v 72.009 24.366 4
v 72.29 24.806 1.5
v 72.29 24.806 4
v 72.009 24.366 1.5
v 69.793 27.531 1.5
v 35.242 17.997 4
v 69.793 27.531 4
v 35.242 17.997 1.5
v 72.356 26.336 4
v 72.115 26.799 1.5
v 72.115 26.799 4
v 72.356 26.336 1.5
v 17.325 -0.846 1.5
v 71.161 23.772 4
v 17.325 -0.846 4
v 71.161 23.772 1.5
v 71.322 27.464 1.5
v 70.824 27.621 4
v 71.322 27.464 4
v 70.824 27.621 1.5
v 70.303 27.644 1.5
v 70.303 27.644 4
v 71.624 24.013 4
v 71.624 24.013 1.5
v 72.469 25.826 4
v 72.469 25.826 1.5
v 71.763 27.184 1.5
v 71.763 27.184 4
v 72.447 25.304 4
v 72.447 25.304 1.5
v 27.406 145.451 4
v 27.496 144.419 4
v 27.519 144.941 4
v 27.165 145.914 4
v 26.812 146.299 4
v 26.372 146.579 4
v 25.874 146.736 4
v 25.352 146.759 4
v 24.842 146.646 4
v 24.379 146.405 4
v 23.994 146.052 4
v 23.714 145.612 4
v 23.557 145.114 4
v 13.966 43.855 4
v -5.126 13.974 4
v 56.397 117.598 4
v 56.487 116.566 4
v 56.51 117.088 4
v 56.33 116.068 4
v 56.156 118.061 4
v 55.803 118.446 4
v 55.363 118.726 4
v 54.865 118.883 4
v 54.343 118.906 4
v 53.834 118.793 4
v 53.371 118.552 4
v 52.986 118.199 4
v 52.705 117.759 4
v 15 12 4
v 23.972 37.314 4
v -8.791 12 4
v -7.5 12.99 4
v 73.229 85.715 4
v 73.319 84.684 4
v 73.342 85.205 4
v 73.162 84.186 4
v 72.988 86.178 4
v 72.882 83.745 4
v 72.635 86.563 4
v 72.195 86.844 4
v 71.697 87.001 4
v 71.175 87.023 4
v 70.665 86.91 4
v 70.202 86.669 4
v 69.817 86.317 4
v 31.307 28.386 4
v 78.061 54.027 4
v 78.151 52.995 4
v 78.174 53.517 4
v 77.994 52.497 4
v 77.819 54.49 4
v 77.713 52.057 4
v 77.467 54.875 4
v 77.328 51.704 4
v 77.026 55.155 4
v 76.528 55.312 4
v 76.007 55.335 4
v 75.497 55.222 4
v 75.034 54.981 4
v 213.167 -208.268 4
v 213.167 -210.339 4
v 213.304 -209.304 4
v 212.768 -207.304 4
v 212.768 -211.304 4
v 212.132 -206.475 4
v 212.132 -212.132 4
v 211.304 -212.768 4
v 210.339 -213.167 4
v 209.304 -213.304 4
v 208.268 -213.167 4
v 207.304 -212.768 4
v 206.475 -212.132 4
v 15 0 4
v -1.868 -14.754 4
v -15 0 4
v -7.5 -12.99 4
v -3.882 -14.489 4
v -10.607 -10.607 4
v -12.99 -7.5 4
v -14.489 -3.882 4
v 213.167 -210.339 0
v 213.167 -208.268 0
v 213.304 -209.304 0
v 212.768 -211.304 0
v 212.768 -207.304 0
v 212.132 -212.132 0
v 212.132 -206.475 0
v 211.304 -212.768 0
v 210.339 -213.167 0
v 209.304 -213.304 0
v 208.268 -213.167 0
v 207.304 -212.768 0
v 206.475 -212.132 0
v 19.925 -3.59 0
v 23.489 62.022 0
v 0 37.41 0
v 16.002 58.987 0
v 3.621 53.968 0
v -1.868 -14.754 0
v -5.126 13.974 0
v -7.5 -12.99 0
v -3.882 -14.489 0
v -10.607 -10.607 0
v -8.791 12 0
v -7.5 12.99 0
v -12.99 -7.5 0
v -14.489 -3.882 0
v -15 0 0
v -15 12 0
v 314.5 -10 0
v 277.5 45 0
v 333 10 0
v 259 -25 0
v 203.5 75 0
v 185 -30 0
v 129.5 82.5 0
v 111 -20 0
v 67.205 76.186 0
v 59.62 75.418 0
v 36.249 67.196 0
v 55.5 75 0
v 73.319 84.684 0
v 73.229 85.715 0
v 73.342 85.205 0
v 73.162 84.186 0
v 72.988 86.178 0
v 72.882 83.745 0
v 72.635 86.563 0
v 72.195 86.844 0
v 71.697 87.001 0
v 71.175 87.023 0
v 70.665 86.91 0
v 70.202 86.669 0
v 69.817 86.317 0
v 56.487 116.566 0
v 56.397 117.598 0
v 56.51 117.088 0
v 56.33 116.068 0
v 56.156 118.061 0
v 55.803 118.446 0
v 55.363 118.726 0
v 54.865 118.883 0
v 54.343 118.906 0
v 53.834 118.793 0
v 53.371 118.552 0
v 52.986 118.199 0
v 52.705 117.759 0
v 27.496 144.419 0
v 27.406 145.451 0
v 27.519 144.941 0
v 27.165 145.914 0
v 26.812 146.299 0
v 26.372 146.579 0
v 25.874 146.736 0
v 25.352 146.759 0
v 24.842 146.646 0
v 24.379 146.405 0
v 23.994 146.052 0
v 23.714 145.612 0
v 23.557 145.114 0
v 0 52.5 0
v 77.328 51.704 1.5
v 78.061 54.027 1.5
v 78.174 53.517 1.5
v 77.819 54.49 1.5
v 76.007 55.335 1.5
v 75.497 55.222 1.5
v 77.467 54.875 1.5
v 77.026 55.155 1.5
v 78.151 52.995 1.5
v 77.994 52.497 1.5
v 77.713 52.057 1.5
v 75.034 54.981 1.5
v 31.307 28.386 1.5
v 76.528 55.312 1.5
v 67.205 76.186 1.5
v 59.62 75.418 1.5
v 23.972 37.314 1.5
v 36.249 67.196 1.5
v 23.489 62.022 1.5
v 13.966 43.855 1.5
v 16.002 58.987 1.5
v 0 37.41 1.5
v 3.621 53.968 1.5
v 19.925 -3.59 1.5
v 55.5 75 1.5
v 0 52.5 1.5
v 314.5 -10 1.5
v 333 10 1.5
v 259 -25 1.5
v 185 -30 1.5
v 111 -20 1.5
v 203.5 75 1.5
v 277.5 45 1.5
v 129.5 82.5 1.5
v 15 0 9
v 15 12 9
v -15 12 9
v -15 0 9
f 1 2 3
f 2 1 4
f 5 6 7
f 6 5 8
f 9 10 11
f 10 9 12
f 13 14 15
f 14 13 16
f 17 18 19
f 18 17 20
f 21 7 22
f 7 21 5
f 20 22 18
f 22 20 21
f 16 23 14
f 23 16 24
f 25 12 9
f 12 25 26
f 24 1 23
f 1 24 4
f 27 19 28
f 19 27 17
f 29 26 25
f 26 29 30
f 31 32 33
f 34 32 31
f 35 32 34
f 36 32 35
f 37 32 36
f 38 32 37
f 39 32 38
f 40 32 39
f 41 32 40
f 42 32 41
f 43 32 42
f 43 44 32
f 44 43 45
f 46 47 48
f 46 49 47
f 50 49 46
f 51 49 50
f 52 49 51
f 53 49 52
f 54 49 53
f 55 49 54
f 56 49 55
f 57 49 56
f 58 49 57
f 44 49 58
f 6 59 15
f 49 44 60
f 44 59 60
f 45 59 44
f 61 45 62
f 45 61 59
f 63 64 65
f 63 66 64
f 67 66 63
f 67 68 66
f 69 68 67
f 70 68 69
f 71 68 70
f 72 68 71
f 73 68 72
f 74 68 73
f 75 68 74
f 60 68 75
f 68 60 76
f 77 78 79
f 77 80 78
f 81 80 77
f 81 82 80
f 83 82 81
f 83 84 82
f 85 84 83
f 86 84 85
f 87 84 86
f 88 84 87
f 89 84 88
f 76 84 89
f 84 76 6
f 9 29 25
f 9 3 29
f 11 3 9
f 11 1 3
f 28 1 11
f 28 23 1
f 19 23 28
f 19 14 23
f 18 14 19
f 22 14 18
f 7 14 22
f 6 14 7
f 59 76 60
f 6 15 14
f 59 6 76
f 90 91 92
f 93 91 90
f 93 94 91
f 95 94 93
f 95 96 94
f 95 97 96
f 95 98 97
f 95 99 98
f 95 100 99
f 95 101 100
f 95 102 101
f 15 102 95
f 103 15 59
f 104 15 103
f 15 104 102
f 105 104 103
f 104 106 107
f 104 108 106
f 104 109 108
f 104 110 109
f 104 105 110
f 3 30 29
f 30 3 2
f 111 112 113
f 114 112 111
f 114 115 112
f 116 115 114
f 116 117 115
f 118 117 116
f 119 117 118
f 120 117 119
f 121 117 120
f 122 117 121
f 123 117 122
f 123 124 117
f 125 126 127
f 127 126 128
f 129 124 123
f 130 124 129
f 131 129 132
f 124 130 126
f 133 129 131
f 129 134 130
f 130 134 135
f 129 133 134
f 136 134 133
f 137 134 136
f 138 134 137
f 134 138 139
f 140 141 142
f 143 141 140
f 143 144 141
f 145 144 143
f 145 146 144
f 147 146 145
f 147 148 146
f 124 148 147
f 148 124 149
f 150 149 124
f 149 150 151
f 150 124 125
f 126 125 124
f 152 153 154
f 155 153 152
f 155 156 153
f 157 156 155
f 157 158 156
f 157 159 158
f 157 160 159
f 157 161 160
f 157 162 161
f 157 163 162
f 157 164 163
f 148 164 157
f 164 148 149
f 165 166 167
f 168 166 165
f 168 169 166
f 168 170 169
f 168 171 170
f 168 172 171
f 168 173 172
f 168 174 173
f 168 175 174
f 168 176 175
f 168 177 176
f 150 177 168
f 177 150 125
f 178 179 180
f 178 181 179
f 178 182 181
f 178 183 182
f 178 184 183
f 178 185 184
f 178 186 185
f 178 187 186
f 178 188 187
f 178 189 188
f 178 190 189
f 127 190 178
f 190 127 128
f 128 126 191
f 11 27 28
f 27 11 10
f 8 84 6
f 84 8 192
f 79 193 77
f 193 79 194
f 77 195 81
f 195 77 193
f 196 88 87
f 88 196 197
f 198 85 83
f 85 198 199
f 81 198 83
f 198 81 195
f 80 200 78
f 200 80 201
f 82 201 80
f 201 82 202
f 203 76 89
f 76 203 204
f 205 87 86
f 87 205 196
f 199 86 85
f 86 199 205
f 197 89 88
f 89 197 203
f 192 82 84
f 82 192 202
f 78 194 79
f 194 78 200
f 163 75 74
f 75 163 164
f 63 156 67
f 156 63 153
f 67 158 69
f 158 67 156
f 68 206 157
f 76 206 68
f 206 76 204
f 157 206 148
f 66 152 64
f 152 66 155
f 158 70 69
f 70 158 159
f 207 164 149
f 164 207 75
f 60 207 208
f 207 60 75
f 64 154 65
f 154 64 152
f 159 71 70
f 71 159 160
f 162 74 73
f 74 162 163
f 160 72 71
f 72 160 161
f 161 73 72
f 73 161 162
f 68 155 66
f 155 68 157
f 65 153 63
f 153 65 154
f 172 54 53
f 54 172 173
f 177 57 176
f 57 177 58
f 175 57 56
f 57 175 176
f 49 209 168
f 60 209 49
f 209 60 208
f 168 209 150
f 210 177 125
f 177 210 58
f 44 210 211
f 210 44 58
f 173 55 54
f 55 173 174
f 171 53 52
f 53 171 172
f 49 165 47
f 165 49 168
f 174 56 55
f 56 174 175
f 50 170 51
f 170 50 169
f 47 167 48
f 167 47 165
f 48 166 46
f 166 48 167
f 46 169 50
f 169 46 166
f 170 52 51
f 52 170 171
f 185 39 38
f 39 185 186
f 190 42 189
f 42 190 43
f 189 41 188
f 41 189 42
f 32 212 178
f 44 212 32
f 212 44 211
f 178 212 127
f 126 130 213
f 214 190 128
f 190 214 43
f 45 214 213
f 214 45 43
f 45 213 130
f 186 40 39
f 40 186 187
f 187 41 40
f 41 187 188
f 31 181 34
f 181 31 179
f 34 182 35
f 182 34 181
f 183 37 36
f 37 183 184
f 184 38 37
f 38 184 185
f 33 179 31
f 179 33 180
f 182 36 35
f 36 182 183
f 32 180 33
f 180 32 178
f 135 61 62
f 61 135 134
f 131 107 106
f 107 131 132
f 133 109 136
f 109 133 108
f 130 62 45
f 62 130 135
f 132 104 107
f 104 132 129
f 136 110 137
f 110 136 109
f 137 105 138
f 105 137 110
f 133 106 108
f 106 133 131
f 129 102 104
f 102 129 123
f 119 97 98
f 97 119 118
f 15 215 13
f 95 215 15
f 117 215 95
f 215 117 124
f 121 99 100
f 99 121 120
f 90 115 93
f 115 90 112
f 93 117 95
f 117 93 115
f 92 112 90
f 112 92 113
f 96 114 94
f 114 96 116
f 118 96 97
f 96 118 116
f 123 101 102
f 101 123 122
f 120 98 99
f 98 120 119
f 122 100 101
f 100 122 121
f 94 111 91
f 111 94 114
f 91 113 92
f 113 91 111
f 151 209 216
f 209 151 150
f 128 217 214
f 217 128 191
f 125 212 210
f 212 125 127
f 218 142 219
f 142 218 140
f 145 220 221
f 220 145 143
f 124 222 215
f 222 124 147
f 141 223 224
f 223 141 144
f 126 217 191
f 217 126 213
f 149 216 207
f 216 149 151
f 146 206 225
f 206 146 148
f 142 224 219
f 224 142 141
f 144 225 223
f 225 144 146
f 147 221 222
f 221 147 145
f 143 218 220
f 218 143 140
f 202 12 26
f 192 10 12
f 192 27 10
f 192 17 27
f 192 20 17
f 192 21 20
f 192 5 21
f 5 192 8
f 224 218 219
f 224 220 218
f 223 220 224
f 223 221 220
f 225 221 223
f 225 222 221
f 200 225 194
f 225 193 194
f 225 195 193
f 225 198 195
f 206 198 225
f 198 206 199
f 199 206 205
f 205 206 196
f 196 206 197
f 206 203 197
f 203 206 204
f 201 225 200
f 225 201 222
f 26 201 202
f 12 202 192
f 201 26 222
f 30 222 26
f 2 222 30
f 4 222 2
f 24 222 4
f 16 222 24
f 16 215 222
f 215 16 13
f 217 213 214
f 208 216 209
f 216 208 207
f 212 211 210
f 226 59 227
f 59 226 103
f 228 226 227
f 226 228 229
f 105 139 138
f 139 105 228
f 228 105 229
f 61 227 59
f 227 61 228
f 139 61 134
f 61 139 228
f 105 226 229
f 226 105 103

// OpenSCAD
// DRAGON WING — single piece, 370mm span, parametric
// Prints flat on the bed, slots into dragon head wing mount
// Bat-wing design: membrane between structural fingers

// Material: PA12-CF black (for the frame) or translucent PETG (backlit effect)

/* [Wing Dimensions] */
SPAN = 370;             // mm — total span from shoulder to tip
CHORD = 150;            // mm — wing depth (shoulder to trailing edge)
FINGER_COUNT = 5;       // number of structural fingers
MEMBRANE_THICK = 1.5;   // mm — thin for translucency
FRAME_THICK = 4;        // mm — structural frame

$fn = 24;

// Wing frame — fingers radiating from shoulder
module wing_frame() {
    // Shoulder joint — mounts to dragon head
    translate([0, 0, 0]) {
        cylinder(h=FRAME_THICK, r=15);
    }
    
    // Main leading edge spar
    translate([0, 0, 0]) {
        rotate([0, 0, -45]) {
            hull() {
                cylinder(h=FRAME_THICK, r=12);
                translate([SPAN * 0.8, 0, 0]) {
                    cylinder(h=FRAME_THICK, r=4);
                }
            }
        }
    }
    
    // Fingers — radiating structure
    for (i = [0: FINGER_COUNT - 1]) {
        angle = -70 + i * 15;  // fan out
        translate([0, 0, 0]) {
            rotate([0, 0, angle]) {
                hull() {
                    cylinder(h=FRAME_THICK, r=8);
                    length = CHORD * (0.5 + i * 0.12);
                    translate([0, length, 0]) {
                        cylinder(h=FRAME_THICK, r=2);
                    }
                }
            }
        }
    }
}

// Membrane — thin web between fingers
module membrane() {
    linear_extrude(height=MEMBRANE_THICK) {
        // Approximate shape using a polygon between finger tips
        polygon(points=[
            [0, 0],  // shoulder
            // Along leading edge
            [SPAN * 0.3, -20],
            [SPAN * 0.5, -30],
            [SPAN * 0.7, -25],
            [SPAN * 0.85, -10],
            // Wing tip
            [SPAN * 0.9, 10],
            // Sweep back along trailing edge (finger tips)
            [SPAN * 0.75, CHORD * 0.3],
            [SPAN * 0.55, CHORD * 0.5],
            [SPAN * 0.35, CHORD * 0.55],
            [SPAN * 0.15, CHORD * 0.5],
            [0, CHORD * 0.35],
        ]);
    }
}

// Mount pin — slides into dragon head dovetail
module mount_pin() {
    translate([-15, 0, 0]) {
        cube([30, 12, FRAME_THICK + 5]);
    }
}

// Assembly
union() {
    wing_frame();
    membrane();
    mount_pin();
}

echo(str("Wing span: ", SPAN, "mm — fits bed: ", SPAN < 392));
echo(str("Fingers: ", FINGER_COUNT));
